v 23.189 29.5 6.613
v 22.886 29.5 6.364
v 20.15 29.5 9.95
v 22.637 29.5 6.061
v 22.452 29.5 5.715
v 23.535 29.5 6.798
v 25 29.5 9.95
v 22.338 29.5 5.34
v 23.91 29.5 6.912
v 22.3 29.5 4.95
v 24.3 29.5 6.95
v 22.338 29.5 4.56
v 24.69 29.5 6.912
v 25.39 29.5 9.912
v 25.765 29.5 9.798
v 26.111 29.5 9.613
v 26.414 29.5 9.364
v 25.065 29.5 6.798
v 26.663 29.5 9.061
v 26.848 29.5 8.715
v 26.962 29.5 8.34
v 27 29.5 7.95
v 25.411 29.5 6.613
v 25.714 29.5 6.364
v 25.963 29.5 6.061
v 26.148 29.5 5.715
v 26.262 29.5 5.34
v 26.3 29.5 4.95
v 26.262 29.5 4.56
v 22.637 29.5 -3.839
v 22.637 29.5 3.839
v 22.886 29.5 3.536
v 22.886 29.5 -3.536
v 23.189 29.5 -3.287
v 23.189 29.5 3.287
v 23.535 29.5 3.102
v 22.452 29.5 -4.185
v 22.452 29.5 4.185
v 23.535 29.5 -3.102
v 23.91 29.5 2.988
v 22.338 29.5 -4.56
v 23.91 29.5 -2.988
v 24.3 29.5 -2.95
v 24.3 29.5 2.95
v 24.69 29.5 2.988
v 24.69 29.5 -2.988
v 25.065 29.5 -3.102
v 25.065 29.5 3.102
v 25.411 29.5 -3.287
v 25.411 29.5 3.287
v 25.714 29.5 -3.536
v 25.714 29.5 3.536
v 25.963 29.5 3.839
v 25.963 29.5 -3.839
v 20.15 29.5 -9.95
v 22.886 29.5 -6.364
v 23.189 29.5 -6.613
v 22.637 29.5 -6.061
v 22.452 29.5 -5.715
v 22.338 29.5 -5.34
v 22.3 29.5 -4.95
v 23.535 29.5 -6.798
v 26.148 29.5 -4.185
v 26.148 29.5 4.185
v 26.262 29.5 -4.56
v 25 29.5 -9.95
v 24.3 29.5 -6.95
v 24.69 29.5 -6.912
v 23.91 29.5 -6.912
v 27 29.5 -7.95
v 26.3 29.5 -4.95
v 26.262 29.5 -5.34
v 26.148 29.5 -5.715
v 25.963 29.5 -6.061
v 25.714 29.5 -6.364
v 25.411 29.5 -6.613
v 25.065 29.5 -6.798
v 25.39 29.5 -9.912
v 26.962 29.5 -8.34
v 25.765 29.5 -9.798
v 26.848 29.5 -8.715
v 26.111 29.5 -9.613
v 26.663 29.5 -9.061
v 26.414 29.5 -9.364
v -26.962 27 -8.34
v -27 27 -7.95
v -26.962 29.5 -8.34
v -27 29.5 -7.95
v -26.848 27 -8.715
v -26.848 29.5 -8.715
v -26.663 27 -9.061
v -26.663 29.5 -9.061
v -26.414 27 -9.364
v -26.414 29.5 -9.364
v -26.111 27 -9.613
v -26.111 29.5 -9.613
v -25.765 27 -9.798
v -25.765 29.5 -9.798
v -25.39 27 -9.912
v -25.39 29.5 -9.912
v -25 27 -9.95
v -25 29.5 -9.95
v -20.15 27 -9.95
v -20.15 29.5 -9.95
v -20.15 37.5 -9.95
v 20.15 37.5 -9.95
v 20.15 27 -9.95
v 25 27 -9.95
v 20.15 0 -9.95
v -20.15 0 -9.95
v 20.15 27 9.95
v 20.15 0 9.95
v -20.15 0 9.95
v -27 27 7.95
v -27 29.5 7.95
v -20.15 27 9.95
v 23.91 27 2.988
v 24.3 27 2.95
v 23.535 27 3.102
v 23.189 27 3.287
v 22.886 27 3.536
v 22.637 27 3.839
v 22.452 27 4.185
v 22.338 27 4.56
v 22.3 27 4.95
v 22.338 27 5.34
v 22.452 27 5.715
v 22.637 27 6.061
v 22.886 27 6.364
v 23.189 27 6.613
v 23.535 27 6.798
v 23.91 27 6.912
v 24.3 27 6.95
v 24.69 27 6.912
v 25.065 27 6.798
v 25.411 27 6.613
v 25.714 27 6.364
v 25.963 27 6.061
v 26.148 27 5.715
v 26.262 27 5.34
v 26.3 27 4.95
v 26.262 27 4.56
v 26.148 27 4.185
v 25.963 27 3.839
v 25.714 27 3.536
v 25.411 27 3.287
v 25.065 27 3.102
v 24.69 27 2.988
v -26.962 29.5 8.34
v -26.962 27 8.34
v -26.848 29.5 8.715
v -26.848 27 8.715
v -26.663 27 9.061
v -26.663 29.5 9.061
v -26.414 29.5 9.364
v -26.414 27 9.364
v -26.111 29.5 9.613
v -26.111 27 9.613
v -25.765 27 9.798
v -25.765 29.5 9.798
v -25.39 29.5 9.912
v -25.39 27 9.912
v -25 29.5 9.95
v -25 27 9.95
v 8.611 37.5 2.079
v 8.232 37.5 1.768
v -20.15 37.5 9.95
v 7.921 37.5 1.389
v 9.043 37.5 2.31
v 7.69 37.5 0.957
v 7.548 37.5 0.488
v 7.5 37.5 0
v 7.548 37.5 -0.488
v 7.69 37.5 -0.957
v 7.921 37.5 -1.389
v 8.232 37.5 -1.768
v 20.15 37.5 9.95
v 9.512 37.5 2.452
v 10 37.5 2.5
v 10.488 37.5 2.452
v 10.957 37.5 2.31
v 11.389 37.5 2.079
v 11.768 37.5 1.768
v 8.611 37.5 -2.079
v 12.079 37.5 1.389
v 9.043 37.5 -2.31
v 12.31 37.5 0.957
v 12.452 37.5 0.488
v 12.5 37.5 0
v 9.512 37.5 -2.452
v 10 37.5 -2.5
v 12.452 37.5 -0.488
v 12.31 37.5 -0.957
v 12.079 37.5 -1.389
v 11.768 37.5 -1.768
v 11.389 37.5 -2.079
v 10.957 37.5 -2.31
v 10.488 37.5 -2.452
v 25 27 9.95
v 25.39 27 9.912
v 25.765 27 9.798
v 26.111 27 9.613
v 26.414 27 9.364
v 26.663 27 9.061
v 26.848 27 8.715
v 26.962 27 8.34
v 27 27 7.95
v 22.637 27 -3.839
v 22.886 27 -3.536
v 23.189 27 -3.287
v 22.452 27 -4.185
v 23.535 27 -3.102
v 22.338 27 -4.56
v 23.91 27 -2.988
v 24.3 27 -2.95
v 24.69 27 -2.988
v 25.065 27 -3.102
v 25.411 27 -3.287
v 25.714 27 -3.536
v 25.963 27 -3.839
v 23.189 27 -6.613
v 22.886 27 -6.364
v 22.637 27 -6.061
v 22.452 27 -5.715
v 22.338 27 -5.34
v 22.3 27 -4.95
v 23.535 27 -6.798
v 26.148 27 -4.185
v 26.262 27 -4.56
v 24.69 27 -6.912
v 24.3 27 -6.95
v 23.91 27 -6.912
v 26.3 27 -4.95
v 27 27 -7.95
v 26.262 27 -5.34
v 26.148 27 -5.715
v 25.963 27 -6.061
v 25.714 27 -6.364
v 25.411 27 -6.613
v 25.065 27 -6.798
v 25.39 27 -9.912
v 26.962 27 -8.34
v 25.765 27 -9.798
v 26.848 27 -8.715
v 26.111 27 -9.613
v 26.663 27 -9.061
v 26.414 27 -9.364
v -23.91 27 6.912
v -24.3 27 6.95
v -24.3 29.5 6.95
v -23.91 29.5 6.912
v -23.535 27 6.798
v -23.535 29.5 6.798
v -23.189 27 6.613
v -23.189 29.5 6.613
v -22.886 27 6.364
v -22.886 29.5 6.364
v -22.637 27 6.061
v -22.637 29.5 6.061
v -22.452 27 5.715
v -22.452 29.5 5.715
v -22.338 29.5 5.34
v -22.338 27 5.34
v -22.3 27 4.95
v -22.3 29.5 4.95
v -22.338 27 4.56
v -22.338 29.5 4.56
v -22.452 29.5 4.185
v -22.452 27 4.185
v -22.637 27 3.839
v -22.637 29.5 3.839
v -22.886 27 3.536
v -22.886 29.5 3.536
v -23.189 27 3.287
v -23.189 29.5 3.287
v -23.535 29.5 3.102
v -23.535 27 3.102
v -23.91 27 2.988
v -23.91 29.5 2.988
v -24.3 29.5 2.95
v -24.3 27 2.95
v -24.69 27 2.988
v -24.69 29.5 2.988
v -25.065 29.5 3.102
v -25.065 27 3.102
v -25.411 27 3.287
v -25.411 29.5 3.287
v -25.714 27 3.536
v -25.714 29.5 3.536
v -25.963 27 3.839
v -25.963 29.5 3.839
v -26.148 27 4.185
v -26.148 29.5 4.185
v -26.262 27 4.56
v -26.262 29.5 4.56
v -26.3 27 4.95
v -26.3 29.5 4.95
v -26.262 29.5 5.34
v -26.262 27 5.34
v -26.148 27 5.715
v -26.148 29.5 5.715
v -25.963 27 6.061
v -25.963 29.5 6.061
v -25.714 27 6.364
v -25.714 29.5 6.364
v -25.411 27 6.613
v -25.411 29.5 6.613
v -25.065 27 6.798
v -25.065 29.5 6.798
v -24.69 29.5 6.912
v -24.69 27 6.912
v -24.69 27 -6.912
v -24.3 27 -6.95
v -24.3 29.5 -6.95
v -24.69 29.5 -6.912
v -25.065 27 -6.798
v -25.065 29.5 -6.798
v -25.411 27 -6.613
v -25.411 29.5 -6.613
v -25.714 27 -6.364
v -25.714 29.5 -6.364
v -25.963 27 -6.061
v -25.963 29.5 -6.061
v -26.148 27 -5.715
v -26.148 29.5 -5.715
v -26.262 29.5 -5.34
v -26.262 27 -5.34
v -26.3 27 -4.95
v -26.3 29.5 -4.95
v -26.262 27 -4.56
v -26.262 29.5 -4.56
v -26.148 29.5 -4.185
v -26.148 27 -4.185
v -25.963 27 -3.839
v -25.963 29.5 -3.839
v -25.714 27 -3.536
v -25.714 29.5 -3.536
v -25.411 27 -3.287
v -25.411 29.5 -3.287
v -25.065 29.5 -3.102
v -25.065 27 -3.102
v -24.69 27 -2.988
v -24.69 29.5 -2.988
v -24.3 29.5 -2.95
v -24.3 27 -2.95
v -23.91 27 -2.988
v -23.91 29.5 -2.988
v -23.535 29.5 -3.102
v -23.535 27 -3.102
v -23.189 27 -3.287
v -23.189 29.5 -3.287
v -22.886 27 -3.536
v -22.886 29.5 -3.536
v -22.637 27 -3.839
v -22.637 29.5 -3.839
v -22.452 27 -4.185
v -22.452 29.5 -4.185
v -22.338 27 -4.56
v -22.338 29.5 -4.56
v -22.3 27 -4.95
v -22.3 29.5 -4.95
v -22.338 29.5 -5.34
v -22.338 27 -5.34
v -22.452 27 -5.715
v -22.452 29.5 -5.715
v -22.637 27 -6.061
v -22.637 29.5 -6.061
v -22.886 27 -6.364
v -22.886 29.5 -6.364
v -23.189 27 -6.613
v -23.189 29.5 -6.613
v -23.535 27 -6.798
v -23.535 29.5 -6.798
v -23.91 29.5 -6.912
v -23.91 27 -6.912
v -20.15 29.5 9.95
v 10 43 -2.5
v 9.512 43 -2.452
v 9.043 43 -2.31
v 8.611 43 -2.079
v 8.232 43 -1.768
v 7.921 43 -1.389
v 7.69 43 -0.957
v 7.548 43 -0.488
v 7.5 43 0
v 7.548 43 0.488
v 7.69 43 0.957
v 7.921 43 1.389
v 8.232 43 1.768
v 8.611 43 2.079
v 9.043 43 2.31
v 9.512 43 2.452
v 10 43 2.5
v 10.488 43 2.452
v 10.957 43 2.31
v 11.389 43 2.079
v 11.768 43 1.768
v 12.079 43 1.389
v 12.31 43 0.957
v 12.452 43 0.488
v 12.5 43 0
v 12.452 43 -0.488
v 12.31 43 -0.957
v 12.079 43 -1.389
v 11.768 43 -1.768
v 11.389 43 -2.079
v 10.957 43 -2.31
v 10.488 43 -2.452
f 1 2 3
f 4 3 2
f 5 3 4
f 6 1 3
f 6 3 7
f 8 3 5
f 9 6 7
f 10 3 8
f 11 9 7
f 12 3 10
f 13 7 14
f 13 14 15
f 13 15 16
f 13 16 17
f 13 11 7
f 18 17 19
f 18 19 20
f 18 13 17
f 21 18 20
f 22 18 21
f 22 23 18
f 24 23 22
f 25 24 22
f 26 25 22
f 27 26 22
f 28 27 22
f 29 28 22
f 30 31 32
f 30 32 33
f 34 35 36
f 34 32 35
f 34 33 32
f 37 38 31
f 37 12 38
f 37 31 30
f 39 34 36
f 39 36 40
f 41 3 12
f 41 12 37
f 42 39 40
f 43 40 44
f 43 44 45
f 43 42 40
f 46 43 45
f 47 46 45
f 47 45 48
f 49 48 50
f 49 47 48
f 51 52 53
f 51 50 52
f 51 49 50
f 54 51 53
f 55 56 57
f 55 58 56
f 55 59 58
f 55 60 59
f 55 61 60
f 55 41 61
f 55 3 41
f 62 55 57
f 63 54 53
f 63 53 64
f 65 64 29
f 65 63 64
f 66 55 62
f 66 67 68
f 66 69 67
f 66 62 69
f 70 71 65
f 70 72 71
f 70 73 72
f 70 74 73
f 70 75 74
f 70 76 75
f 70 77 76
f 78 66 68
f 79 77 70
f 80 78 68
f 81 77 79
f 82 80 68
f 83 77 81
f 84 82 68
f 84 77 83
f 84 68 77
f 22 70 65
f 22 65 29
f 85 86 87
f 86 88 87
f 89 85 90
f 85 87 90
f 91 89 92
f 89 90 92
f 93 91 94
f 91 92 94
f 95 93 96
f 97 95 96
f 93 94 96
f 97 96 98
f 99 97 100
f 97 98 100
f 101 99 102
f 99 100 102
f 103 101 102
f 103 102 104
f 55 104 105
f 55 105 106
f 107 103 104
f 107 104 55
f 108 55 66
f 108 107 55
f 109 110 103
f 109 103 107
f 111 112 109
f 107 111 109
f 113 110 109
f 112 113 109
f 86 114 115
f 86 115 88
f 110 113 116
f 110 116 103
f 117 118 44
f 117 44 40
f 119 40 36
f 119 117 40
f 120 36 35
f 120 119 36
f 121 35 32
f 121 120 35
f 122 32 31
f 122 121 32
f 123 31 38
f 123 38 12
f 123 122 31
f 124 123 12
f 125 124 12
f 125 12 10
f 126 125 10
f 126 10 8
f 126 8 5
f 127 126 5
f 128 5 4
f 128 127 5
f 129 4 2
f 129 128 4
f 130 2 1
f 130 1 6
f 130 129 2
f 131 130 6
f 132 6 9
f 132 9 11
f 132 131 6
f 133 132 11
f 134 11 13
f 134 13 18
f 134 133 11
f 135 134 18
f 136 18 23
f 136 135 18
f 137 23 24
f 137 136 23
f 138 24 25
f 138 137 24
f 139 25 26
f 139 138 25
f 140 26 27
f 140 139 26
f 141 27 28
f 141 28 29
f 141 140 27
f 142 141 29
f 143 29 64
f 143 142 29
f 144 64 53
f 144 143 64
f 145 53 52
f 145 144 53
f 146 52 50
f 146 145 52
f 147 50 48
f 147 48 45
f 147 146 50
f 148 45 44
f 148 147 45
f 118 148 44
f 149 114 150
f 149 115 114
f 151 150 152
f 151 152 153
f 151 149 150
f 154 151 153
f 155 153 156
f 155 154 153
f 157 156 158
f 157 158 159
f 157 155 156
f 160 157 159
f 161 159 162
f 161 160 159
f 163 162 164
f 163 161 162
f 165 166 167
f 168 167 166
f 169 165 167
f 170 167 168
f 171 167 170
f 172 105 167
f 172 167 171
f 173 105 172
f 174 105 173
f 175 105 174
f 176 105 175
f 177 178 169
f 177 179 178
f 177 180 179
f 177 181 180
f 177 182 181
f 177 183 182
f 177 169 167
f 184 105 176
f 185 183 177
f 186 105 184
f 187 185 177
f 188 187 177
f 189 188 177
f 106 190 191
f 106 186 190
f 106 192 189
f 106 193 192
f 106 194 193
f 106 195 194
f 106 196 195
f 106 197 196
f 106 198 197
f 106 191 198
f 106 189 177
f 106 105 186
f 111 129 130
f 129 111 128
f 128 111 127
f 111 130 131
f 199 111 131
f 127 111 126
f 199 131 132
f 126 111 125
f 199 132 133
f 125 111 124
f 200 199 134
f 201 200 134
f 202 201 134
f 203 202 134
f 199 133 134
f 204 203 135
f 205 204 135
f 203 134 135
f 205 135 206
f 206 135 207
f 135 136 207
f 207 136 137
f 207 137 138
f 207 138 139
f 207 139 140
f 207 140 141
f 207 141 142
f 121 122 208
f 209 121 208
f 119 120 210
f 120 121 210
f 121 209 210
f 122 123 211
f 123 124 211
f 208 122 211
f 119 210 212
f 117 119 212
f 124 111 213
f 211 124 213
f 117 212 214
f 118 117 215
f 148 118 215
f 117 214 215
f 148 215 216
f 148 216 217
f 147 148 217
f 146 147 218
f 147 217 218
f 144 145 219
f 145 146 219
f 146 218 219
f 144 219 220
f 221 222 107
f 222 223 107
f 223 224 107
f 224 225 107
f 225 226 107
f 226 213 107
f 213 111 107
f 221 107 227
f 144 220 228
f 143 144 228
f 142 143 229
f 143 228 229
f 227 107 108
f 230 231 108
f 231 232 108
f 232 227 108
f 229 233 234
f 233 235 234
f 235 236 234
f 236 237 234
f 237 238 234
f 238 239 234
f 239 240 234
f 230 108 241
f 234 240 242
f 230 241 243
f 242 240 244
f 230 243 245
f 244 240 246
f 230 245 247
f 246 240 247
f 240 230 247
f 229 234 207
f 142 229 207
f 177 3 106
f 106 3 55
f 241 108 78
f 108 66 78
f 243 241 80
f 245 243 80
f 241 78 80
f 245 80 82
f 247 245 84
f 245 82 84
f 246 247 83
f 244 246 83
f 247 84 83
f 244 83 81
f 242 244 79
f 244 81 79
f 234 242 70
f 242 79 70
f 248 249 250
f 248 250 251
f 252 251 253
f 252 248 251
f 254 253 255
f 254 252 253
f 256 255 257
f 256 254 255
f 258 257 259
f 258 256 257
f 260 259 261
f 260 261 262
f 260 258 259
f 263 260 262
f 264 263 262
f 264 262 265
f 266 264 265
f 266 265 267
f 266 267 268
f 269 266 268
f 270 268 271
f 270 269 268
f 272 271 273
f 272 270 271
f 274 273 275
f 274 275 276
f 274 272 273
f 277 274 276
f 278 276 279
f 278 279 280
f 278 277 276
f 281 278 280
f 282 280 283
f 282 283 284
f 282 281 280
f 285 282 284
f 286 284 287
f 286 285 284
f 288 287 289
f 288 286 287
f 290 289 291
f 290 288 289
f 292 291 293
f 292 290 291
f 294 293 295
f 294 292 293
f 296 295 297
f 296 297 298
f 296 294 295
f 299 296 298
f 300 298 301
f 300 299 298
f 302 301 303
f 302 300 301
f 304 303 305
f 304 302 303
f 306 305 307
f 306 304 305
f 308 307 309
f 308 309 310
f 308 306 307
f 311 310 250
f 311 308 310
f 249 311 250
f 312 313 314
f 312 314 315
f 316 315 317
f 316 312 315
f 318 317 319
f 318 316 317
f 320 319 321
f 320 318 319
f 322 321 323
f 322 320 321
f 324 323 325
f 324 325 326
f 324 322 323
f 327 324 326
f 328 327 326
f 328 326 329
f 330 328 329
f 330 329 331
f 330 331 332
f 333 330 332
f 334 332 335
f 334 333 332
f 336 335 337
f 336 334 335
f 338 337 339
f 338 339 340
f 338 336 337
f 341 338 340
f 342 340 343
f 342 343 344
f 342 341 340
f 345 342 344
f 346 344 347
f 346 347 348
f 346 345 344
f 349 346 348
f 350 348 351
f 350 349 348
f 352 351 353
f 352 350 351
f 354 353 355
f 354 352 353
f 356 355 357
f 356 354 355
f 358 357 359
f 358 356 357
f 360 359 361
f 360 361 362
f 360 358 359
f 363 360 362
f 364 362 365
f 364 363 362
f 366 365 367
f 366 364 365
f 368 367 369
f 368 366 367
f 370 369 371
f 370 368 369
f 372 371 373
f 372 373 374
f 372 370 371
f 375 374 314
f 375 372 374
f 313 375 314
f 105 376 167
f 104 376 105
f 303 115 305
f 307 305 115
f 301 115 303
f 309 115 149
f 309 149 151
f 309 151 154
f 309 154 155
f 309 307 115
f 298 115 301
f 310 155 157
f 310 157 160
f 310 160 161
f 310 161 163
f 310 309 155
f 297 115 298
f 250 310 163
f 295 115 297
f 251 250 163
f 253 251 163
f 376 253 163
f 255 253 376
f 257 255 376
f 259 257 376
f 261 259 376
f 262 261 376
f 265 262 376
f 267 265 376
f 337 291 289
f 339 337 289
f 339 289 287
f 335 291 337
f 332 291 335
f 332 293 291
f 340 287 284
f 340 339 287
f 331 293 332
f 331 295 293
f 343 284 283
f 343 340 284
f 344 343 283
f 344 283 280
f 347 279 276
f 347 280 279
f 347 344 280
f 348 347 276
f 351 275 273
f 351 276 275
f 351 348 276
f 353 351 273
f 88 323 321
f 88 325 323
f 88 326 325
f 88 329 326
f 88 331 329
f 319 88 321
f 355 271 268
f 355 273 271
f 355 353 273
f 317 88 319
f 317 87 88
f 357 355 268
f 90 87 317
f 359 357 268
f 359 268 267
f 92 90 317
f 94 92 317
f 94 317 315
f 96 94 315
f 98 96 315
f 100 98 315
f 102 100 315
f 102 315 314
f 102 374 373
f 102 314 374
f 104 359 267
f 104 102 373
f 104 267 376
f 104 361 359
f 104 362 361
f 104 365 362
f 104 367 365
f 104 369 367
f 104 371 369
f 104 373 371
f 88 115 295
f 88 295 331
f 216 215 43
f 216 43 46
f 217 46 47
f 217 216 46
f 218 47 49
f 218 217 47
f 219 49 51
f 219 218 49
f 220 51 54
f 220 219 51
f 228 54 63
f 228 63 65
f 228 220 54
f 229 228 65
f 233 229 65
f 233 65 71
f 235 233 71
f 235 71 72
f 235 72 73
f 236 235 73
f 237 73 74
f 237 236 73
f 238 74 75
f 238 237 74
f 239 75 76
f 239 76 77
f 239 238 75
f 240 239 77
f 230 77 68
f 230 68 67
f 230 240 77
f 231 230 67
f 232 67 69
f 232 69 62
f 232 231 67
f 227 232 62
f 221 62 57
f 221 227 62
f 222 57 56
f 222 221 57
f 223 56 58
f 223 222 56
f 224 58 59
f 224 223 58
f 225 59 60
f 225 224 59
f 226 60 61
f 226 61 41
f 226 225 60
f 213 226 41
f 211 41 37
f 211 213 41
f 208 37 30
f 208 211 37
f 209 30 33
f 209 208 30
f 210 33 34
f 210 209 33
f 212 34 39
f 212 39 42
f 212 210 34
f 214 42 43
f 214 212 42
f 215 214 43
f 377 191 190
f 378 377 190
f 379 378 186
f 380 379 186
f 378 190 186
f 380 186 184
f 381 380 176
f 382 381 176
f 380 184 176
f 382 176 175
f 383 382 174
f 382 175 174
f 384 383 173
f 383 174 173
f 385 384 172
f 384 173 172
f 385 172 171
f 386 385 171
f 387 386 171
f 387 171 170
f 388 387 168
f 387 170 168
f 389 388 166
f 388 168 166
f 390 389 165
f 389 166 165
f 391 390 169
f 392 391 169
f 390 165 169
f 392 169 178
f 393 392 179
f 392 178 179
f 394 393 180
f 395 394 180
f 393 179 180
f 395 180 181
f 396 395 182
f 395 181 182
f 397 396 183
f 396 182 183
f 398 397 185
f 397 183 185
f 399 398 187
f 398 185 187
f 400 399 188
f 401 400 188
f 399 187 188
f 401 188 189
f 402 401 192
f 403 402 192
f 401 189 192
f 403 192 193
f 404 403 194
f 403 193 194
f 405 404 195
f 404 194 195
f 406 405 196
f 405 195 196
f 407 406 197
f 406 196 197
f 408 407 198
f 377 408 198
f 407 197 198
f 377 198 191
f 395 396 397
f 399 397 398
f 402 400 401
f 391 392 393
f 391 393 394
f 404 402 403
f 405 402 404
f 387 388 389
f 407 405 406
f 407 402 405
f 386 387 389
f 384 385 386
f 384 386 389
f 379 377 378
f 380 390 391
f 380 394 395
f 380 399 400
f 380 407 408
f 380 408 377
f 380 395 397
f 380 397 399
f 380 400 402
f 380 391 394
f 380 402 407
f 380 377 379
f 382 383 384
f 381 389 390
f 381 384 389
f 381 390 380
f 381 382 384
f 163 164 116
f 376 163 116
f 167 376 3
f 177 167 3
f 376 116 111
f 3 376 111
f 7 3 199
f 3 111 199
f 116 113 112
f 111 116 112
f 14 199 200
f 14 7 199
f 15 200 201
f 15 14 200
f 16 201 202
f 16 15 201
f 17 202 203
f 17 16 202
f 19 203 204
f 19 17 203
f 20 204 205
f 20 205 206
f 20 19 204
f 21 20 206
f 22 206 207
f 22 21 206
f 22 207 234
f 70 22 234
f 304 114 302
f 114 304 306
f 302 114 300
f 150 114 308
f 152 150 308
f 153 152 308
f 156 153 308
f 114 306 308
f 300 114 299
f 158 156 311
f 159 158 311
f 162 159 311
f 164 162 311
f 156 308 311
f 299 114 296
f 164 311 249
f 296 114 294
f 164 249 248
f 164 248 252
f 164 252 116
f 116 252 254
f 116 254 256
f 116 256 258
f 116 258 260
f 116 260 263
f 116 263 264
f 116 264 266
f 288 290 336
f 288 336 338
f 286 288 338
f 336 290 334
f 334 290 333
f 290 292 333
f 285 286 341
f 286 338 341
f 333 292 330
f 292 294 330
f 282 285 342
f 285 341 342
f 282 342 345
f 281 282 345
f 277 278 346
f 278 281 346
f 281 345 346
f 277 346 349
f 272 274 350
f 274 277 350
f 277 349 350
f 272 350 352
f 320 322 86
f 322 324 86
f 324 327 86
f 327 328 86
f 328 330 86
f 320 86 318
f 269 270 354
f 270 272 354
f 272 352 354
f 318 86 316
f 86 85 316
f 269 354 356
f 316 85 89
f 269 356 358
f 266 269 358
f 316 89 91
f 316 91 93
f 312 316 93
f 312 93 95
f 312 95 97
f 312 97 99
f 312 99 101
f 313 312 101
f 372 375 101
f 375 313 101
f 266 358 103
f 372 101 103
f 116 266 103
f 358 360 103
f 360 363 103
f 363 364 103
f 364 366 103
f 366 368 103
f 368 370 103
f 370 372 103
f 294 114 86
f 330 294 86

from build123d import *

# Parameters (mm, degrees)
SKETCH_4_W      = 40.3
SKETCH_4_H      = 19.9
EXTRUDE_2_DEPTH = 37.5
EXTRUDE_START   = 27
SKETCH_5_W      = 54
SKETCH_5_H      = 19.9
SKETCH_5_R      = 2
EXTRUDE_3_DEPTH = 2.5
SKETCH_6_R      = 2.5
EXTRUDE_4_DEPTH = 5.5
EXTRUDE_START_2 = 2.37
SKETCH_8_R      = 2.25
EXTRUDE_5_DEPTH = 30.53
FILLET_1_R      = 2


with BuildPart() as part:
    # 草图4 → 凸台-拉伸2 (new body)
    with BuildSketch(Plane(origin=(0, 0, 0), x_dir=(1, 0, 0), z_dir=(0, 1, 0))):
        Rectangle(SKETCH_4_W, SKETCH_4_H)
    extrude(amount=EXTRUDE_2_DEPTH)

    # 草图5 → 凸台-拉伸3 (add)
    with BuildSketch(Plane(origin=(0, 0, 0), x_dir=(1, 0, 0), z_dir=(0, 1, 0)).offset(EXTRUDE_START)):
        Rectangle(SKETCH_5_W, SKETCH_5_H)
        with Locations(Location((24.3, 4.95, 0), (0, 0, 270))):
            Circle(SKETCH_5_R, mode=Mode.SUBTRACT)
        with Locations(Location((24.3, -4.95, 0), (0, 0, 90))):
            Circle(SKETCH_5_R, mode=Mode.SUBTRACT)
        with Locations(Location((-24.3, -4.95, 0), (0, 0, 270))):
            Circle(SKETCH_5_R, mode=Mode.SUBTRACT)
        with Locations(Location((-24.3, 4.95, 0), (0, 0, 90))):
            Circle(SKETCH_5_R, mode=Mode.SUBTRACT)
    extrude(amount=EXTRUDE_3_DEPTH)

    # 草图6 → 凸台-拉伸4 (add)
    with BuildSketch(Plane(origin=(0, 37.5, 0), x_dir=(1, 0, 0), z_dir=(0, 1, 0))):
        with Locations(Location((10, 0, 0), (0, 0, 90))):
            Circle(SKETCH_6_R)
    extrude(amount=EXTRUDE_4_DEPTH)

    # 草图8 → 凸台-拉伸5 (add)
    with BuildSketch(Plane(origin=(0, 32.9, 0), x_dir=(-1, 0, 0), z_dir=(0, -1, 0)).offset(EXTRUDE_START_2)):
        with Locations((-10, 0)):
            Circle(SKETCH_8_R)
    extrude(amount=EXTRUDE_5_DEPTH)

    # 圆角1
    fillet_1_edges = [part.edges().sort_by_distance(p)[0] for p in [
        (27, 28.25, -9.95),
        (-27, 28.25, 9.95),
        (27, 28.25, 9.95),
        (-27, 28.25, -9.95),
    ]]
    fillet(fillet_1_edges, radius=FILLET_1_R)


solid = part.part
